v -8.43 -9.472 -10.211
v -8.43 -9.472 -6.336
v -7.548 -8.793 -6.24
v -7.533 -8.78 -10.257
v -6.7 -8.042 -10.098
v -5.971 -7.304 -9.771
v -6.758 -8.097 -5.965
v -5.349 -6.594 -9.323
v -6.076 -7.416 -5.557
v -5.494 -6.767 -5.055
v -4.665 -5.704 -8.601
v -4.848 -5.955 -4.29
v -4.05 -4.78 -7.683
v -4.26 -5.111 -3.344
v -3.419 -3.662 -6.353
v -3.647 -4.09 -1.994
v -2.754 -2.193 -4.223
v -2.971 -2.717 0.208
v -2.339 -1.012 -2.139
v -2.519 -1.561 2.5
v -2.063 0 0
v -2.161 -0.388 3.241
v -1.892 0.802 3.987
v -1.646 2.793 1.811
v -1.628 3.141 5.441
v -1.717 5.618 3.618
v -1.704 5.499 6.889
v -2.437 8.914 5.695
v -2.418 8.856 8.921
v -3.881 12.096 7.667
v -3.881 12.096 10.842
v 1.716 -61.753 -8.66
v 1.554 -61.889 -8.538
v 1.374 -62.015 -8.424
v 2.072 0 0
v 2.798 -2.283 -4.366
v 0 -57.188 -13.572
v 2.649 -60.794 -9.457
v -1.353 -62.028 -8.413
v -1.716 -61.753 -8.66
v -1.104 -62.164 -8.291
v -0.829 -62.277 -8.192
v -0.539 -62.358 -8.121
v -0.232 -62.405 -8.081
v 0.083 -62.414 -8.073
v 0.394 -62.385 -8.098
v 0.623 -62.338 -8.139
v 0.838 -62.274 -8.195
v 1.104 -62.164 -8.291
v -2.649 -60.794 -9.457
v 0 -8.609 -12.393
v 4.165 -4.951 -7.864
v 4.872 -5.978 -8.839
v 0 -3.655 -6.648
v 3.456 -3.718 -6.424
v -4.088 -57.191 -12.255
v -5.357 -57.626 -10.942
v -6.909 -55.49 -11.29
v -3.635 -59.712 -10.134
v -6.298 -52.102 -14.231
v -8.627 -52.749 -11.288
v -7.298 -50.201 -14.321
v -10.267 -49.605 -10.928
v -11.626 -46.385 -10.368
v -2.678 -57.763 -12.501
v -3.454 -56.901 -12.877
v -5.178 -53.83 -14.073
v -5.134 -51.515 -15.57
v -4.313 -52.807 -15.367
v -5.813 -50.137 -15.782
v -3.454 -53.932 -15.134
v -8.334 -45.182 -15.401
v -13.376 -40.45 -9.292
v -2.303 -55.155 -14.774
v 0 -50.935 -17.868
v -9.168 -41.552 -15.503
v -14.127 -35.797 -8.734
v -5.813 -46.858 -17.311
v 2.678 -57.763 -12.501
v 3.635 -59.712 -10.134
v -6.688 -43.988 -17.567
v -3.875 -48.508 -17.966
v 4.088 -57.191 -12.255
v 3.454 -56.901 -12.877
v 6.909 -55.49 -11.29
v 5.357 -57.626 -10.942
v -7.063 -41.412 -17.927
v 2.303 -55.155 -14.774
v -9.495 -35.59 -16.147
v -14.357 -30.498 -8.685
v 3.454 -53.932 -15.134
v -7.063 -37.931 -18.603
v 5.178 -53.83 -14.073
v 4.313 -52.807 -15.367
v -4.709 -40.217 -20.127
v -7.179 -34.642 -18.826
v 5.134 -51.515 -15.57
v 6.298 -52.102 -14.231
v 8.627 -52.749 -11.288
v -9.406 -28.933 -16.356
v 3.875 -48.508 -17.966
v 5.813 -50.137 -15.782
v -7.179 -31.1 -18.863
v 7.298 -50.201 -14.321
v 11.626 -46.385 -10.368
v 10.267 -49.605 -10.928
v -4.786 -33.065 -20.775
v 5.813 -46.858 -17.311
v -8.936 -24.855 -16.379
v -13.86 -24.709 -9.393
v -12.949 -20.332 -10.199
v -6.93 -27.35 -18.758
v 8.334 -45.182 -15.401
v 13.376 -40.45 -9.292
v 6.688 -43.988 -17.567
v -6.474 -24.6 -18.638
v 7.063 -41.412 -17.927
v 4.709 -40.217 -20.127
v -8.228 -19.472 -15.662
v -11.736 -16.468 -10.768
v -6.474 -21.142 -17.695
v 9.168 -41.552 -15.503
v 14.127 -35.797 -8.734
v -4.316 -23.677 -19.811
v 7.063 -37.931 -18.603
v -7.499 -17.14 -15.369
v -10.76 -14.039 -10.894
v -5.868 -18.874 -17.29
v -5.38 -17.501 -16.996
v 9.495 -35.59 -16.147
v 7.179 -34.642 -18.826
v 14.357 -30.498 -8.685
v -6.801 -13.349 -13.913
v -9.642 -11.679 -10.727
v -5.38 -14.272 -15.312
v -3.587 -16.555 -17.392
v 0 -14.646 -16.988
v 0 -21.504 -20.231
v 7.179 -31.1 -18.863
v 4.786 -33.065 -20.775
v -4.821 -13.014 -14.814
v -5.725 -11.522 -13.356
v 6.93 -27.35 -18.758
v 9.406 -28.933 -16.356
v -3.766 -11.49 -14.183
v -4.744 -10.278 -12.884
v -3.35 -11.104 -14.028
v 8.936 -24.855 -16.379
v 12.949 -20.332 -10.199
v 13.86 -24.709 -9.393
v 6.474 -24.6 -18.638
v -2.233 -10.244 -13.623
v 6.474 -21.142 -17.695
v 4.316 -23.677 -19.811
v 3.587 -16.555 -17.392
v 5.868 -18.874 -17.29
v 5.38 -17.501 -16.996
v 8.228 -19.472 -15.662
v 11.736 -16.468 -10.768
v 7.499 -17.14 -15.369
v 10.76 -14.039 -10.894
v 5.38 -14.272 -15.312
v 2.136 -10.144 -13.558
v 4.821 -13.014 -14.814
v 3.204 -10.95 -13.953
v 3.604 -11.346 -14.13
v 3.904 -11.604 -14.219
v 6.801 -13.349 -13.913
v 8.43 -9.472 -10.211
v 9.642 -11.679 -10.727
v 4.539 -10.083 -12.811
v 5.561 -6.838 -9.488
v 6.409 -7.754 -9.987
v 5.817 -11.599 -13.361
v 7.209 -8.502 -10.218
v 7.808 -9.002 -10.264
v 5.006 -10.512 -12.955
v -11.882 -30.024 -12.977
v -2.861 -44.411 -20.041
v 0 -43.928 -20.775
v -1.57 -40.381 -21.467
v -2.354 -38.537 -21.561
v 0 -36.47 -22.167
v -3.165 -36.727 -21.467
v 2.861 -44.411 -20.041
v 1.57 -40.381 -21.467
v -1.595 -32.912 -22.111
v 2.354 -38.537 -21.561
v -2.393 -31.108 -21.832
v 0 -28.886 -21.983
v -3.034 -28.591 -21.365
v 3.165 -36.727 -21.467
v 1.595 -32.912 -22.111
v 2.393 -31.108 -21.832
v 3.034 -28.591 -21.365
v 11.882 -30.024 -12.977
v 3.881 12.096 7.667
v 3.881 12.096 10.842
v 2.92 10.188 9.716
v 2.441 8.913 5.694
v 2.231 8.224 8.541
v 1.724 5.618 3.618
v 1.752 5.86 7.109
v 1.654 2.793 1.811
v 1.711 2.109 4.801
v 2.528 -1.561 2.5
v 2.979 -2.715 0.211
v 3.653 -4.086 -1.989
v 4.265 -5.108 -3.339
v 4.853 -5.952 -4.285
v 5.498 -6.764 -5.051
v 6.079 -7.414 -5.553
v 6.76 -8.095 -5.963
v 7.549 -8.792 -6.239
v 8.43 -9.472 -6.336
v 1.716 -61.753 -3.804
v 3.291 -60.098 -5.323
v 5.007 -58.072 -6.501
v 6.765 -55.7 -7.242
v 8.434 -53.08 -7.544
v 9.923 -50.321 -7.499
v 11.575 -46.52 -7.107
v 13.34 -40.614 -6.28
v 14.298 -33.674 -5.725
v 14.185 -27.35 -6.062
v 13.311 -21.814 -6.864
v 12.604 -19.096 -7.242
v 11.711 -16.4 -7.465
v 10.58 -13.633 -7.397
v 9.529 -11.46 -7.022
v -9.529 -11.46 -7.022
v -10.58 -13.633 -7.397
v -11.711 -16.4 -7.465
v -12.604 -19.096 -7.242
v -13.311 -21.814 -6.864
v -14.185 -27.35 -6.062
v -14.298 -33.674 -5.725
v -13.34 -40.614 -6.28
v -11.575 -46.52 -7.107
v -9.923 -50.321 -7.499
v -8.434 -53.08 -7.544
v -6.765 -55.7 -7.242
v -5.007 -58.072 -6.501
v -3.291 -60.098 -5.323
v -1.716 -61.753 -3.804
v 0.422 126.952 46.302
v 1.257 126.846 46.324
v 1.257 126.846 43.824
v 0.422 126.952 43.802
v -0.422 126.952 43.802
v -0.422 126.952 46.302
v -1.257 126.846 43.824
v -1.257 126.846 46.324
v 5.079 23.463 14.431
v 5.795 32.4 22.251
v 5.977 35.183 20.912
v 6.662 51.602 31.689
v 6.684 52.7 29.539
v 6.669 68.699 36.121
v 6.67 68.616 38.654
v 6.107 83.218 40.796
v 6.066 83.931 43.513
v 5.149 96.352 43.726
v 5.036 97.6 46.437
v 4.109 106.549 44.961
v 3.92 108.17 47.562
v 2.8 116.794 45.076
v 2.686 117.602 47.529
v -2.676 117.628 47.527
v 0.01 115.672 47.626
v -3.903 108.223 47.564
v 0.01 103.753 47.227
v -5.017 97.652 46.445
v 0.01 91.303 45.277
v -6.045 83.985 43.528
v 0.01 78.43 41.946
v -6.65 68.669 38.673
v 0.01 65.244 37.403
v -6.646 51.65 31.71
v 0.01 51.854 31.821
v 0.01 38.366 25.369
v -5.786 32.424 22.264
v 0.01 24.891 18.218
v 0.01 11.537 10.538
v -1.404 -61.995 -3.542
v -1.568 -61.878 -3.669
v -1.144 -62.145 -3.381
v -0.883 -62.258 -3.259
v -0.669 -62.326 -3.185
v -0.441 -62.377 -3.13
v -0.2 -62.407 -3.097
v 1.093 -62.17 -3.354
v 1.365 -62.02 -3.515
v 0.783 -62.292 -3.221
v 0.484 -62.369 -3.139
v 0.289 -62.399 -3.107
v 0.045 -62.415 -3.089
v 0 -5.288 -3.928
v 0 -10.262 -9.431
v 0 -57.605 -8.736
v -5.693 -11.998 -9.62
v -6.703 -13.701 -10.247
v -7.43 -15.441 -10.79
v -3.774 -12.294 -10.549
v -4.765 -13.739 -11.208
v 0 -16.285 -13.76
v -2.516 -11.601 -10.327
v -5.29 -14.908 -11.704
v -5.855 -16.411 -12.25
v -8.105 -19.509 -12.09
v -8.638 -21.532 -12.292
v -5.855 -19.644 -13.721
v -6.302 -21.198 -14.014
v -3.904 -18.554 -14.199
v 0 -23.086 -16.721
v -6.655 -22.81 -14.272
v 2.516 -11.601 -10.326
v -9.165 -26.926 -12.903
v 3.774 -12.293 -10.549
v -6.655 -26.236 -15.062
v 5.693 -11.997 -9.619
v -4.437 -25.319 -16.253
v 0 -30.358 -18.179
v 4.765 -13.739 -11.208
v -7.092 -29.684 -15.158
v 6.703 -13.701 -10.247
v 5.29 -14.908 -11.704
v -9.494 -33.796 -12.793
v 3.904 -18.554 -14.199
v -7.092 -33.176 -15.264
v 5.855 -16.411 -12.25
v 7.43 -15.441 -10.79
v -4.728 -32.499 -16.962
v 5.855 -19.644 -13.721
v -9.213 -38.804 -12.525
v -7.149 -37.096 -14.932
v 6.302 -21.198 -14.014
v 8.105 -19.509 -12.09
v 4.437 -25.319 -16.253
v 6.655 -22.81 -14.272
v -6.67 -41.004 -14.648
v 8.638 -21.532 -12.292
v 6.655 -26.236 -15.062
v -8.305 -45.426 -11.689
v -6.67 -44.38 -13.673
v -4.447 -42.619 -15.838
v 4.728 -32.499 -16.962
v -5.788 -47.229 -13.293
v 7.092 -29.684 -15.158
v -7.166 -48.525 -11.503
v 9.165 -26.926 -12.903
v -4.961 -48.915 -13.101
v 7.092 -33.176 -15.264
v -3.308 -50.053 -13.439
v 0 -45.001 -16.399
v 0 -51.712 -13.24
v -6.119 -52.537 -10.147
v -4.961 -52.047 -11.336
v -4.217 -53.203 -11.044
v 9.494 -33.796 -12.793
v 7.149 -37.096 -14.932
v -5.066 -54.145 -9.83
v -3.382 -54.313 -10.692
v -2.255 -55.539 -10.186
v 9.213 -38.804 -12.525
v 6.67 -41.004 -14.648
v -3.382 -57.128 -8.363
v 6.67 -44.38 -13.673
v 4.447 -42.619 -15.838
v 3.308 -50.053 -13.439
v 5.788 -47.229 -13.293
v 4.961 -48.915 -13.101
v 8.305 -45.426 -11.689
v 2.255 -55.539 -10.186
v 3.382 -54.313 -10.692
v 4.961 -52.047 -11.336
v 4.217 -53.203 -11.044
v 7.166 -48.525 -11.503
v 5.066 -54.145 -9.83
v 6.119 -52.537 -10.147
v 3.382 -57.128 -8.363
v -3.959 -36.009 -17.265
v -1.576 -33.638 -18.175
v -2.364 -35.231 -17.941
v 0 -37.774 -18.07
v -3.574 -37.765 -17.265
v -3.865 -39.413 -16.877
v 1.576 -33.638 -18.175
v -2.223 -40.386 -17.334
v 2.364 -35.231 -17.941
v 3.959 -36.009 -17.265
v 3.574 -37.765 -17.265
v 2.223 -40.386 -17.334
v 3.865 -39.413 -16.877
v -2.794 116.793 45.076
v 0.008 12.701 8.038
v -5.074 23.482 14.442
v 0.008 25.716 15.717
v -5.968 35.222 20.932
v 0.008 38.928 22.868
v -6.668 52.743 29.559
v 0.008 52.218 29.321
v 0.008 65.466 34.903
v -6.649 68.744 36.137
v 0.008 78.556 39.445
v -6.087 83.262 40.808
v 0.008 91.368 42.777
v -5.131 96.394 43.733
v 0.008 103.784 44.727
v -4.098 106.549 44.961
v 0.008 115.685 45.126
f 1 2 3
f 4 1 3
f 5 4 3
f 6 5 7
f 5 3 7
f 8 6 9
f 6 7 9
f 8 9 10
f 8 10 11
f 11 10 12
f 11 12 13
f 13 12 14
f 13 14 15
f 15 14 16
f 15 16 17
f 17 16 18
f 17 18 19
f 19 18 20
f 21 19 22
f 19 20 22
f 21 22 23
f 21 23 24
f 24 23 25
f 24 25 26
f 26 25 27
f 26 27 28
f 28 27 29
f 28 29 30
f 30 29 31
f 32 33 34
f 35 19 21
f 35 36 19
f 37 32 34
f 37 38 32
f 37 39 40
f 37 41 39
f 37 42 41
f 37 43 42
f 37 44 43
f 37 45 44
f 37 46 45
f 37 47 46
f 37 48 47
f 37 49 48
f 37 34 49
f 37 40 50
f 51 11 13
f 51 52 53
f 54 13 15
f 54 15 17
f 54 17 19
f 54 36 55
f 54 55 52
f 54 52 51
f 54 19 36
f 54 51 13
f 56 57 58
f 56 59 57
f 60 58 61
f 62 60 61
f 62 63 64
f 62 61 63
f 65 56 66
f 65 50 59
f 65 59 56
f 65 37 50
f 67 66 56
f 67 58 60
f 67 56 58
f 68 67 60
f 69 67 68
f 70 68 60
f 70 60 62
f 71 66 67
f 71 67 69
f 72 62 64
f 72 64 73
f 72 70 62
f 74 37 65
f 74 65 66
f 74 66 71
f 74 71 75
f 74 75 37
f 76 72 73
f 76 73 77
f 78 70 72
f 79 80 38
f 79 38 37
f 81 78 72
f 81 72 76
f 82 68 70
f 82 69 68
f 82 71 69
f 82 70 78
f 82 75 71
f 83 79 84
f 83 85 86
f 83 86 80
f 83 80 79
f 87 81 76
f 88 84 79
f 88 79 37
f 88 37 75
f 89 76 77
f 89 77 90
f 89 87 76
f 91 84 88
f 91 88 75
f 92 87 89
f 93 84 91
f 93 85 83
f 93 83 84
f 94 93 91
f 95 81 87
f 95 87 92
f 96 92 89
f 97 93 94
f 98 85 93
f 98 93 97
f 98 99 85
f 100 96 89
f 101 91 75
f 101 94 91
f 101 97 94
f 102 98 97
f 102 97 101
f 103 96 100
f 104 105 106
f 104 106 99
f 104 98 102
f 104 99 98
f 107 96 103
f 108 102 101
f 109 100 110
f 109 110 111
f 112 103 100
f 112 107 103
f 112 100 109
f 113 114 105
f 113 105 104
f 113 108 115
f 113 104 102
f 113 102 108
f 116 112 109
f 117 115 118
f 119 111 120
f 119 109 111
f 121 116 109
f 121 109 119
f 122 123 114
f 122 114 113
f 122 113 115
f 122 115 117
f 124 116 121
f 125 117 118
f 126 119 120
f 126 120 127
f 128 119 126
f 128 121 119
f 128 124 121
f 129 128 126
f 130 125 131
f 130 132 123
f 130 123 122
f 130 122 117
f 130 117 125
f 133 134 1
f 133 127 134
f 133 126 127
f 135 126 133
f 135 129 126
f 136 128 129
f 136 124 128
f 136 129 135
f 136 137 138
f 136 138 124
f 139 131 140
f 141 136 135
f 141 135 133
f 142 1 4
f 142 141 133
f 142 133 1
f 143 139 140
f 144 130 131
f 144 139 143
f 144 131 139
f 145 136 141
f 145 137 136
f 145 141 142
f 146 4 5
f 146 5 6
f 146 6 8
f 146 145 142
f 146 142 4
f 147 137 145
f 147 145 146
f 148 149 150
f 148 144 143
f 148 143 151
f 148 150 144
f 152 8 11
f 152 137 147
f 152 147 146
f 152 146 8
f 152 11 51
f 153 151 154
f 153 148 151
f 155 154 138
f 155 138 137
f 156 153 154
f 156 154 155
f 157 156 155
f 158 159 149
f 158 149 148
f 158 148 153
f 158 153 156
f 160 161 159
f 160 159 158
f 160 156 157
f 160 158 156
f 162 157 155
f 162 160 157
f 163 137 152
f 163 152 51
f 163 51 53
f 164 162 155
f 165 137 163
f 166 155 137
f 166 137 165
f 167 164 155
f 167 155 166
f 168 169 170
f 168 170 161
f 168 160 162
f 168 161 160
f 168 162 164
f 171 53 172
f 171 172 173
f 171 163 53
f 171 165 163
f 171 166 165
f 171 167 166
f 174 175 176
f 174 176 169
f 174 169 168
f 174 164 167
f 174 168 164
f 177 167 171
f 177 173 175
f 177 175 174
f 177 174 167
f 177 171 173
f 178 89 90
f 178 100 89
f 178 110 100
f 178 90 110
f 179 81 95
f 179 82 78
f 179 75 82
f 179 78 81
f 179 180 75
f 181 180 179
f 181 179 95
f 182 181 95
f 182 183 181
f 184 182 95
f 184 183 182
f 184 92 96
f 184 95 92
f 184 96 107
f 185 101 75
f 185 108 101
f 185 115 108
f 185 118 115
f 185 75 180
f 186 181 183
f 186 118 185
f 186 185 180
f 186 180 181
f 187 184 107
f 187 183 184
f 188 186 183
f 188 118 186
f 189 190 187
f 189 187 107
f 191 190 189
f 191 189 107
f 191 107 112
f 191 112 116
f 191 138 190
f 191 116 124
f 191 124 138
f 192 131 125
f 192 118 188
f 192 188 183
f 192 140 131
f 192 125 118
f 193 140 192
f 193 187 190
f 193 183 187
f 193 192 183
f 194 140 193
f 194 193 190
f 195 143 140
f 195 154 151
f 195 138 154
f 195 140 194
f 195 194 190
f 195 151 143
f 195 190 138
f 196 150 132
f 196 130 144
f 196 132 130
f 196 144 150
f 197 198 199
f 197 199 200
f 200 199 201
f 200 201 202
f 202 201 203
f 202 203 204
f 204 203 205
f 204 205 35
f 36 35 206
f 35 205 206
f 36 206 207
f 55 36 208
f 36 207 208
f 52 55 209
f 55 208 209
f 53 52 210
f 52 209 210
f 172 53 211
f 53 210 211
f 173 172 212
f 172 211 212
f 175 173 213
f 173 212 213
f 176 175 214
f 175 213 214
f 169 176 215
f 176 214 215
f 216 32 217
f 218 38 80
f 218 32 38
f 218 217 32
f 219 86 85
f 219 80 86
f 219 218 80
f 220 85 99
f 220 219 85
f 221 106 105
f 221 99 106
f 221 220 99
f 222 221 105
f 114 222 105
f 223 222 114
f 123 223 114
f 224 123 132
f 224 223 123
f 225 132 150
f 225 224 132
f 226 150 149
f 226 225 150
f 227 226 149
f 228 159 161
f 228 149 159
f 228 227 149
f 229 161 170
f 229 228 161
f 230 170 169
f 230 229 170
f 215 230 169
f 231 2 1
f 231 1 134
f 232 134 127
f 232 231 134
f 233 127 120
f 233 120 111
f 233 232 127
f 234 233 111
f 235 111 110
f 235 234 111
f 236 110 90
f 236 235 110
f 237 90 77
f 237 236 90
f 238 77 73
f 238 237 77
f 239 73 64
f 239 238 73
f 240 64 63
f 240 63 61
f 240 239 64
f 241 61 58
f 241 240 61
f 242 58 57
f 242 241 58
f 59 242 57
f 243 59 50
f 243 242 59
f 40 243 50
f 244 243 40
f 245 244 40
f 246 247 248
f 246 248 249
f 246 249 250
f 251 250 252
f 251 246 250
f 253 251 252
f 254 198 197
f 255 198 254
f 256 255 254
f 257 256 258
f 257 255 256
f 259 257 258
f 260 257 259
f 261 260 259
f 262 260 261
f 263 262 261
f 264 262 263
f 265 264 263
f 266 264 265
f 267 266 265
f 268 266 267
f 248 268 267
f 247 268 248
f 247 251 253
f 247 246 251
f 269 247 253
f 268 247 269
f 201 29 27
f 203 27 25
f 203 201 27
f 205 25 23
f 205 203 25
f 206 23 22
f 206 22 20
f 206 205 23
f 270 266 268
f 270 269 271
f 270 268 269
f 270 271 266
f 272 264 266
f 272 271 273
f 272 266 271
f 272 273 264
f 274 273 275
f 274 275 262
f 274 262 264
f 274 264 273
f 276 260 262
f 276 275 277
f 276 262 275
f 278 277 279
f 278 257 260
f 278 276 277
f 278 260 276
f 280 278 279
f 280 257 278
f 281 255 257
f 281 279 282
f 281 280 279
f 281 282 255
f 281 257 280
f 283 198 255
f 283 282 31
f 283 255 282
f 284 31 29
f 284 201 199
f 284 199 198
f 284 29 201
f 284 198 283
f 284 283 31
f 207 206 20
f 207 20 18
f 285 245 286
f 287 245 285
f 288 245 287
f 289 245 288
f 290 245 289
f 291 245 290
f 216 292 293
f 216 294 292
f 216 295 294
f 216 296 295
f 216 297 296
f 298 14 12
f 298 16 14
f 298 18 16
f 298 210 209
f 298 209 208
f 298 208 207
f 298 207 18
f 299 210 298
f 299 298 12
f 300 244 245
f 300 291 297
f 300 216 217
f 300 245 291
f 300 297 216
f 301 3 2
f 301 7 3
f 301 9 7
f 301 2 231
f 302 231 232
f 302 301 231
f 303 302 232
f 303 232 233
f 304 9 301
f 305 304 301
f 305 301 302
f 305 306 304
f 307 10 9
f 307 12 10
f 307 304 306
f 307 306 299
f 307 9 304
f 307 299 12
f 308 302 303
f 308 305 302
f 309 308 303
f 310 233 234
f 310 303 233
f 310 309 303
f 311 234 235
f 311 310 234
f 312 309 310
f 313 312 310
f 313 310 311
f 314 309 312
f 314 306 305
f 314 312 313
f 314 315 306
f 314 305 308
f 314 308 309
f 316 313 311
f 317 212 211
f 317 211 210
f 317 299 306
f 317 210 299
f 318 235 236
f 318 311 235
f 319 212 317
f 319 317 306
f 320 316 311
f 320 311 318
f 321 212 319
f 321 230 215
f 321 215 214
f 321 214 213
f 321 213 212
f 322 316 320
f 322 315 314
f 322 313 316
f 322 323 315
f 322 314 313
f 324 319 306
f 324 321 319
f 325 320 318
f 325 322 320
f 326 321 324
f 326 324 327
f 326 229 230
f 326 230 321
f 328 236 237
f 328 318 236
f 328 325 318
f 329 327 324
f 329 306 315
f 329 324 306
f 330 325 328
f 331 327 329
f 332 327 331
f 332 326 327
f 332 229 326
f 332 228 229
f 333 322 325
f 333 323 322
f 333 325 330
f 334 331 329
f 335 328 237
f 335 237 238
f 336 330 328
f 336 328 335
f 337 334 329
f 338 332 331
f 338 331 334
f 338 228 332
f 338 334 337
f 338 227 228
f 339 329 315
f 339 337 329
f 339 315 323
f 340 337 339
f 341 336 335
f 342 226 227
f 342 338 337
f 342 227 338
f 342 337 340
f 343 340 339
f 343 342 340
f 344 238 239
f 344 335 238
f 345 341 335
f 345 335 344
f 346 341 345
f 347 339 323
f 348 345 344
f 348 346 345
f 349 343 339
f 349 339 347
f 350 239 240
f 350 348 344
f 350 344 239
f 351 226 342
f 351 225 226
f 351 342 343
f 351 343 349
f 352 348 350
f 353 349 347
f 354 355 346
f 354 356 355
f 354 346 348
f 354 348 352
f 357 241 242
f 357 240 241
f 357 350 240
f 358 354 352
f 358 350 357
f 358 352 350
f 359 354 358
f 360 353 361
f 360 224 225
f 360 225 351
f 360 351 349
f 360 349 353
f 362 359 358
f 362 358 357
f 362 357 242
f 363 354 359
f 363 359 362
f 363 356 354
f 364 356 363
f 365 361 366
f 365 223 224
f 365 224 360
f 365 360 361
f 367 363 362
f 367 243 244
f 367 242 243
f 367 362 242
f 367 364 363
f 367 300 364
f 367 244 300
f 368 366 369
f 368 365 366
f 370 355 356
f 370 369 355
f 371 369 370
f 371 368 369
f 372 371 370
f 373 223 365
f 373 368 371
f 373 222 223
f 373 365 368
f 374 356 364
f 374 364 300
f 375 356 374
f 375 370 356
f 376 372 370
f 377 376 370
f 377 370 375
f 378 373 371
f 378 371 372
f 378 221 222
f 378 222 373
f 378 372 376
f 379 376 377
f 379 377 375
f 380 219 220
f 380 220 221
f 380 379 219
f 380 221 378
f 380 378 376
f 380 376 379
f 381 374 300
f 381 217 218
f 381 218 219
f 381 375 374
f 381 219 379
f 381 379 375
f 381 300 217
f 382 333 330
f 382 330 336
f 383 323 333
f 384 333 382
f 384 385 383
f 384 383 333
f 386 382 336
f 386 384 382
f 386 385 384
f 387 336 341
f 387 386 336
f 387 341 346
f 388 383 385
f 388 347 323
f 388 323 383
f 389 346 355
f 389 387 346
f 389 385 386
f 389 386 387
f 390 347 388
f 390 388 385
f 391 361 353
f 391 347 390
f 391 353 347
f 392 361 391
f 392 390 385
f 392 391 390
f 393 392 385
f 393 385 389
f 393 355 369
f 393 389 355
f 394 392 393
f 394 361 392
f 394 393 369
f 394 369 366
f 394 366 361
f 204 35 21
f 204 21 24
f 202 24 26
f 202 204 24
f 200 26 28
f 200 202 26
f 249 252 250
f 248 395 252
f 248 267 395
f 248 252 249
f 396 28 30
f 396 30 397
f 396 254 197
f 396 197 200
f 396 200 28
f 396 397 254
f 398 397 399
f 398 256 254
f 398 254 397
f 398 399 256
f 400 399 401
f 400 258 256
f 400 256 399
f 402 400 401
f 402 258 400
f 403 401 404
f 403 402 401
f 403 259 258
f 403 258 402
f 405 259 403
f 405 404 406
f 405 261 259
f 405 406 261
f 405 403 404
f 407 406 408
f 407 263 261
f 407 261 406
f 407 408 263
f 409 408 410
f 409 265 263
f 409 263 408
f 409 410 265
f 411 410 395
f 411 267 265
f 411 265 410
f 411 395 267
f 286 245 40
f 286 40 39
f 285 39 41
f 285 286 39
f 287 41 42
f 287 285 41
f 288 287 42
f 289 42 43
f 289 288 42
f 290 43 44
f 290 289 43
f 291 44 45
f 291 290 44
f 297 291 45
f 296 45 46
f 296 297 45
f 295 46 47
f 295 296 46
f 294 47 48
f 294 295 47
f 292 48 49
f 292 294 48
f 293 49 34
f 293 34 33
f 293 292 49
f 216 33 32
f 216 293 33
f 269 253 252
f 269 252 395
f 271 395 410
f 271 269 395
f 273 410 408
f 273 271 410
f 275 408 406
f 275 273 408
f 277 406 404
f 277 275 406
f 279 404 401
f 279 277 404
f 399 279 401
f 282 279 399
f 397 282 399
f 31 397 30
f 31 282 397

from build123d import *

# Parameters (mm, degrees)
EXTRUDE003_DEPTH = 80


with BuildPart() as extrude003:
    # Sketch005 → Extrude003 (new body)
    with BuildSketch(Plane.XY.offset(56)):
        with BuildLine():
            ThreePointArc((-1.257248, 126.846052), (-6.630881, 69.563727), (-3.880743, 12.095671))
            ThreePointArc((-8.430109, -9.471528), (-1.966283, 0.428417), (-3.880743, 12.095671))
            ThreePointArc((-8.430109, -9.471528), (-14.013962, -36.760649), (-1.716067, -61.753395))
            ThreePointArc((-1.716067, -61.753395), (0, -62.415289), (1.716067, -61.753395))
            ThreePointArc((1.716067, -61.753395), (14.013962, -36.760649), (8.430109, -9.471528))
            ThreePointArc((3.880743, 12.095671), (1.97472, 0.430197), (8.430109, -9.471528))
            ThreePointArc((3.880743, 12.095671), (6.649694, 69.564157), (1.257248, 126.846052))
            ThreePointArc((1.257248, 126.846052), (0, 126.965641), (-1.257248, 126.846052))
        make_face()
    extrude(amount=-EXTRUDE003_DEPTH)


with BuildPart() as common001:
    # Sketch002 → Loft section 0
    with BuildSketch(Plane.YZ.offset(-15)):
        with BuildLine():
            ThreePointArc((-56.485305, 2.198639), (-58.168632, 1.688359), (-57.675258, 0))
            ThreePointArc((-57.675258, 0), (-28.837629, -7.457321), (0, 0))
            add(Edge.make_bspline(
                [(0, 0), (42.23759, 27.563965), (91.892059, 51.91864), (128.407314, 43.484848)],
                knots=[0, 0, 0, 0, 1, 1, 1, 1], degree=3))
            ThreePointArc((128.407314, 43.484848), (129.387159, 44.734848), (128.407314, 45.984848))
            add(Edge.make_bspline(
                [(-0.626922, 2.5), (42.23759, 30.063965), (91.84727, 54.41864), (128.407314, 45.984848)],
                knots=[0, 0, 0, 0, 1, 1, 1, 1], degree=3))
            ThreePointArc((-0.626922, 2.5), (-28.518324, -4.655084), (-56.485305, 2.198639))
        make_face()
    # Sketch003 → Loft section 1
    with BuildSketch(Plane.YZ):
        with BuildLine():
            ThreePointArc((-64.83973, 1.042682), (-66.480817, 1.621814), (-67.111913, 0))
            ThreePointArc((-67.111913, 0), (-33.555956, -22.283915), (0, 0))
            add(Edge.make_bspline(
                [(0, 0), (42.23759, 27.563965), (91.892059, 51.91864), (128.407314, 43.484848)],
                knots=[0, 0, 0, 0, 1, 1, 1, 1], degree=3))
            ThreePointArc((128.407314, 43.484848), (129.387159, 44.734848), (128.407314, 45.984848))
            add(Edge.make_bspline(
                [(-1.587823, 2.5), (42.23759, 30.063965), (91.84727, 54.41864), (128.407314, 45.984848)],
                knots=[0, 0, 0, 0, 1, 1, 1, 1], degree=3))
            ThreePointArc((-1.587823, 2.5), (-32.750953, -18.316585), (-64.83973, 1.042682))
        make_face()
    # Sketch004 → Loft section 2
    with BuildSketch(Plane.YZ.offset(15)):
        with BuildLine():
            ThreePointArc((-56.485305, 2.198639), (-58.168632, 1.688359), (-57.675258, 0))
            ThreePointArc((-57.675258, 0), (-28.837629, -7.457321), (0, 0))
            add(Edge.make_bspline(
                [(0, 0), (42.23759, 27.563965), (91.892059, 51.91864), (128.407314, 43.484848)],
                knots=[0, 0, 0, 0, 1, 1, 1, 1], degree=3))
            ThreePointArc((128.407314, 43.484848), (129.387159, 44.734848), (128.407314, 45.984848))
            add(Edge.make_bspline(
                [(-0.626922, 2.5), (42.23759, 30.063965), (91.84727, 54.41864), (128.407314, 45.984848)],
                knots=[0, 0, 0, 0, 1, 1, 1, 1], degree=3))
            ThreePointArc((-0.626922, 2.5), (-28.518324, -4.655084), (-56.485305, 2.198639))
        make_face()
    loft()

    # Common001: intersect Extrude003
    add(extrude003.part, mode=Mode.INTERSECT)


solid = common001.part
